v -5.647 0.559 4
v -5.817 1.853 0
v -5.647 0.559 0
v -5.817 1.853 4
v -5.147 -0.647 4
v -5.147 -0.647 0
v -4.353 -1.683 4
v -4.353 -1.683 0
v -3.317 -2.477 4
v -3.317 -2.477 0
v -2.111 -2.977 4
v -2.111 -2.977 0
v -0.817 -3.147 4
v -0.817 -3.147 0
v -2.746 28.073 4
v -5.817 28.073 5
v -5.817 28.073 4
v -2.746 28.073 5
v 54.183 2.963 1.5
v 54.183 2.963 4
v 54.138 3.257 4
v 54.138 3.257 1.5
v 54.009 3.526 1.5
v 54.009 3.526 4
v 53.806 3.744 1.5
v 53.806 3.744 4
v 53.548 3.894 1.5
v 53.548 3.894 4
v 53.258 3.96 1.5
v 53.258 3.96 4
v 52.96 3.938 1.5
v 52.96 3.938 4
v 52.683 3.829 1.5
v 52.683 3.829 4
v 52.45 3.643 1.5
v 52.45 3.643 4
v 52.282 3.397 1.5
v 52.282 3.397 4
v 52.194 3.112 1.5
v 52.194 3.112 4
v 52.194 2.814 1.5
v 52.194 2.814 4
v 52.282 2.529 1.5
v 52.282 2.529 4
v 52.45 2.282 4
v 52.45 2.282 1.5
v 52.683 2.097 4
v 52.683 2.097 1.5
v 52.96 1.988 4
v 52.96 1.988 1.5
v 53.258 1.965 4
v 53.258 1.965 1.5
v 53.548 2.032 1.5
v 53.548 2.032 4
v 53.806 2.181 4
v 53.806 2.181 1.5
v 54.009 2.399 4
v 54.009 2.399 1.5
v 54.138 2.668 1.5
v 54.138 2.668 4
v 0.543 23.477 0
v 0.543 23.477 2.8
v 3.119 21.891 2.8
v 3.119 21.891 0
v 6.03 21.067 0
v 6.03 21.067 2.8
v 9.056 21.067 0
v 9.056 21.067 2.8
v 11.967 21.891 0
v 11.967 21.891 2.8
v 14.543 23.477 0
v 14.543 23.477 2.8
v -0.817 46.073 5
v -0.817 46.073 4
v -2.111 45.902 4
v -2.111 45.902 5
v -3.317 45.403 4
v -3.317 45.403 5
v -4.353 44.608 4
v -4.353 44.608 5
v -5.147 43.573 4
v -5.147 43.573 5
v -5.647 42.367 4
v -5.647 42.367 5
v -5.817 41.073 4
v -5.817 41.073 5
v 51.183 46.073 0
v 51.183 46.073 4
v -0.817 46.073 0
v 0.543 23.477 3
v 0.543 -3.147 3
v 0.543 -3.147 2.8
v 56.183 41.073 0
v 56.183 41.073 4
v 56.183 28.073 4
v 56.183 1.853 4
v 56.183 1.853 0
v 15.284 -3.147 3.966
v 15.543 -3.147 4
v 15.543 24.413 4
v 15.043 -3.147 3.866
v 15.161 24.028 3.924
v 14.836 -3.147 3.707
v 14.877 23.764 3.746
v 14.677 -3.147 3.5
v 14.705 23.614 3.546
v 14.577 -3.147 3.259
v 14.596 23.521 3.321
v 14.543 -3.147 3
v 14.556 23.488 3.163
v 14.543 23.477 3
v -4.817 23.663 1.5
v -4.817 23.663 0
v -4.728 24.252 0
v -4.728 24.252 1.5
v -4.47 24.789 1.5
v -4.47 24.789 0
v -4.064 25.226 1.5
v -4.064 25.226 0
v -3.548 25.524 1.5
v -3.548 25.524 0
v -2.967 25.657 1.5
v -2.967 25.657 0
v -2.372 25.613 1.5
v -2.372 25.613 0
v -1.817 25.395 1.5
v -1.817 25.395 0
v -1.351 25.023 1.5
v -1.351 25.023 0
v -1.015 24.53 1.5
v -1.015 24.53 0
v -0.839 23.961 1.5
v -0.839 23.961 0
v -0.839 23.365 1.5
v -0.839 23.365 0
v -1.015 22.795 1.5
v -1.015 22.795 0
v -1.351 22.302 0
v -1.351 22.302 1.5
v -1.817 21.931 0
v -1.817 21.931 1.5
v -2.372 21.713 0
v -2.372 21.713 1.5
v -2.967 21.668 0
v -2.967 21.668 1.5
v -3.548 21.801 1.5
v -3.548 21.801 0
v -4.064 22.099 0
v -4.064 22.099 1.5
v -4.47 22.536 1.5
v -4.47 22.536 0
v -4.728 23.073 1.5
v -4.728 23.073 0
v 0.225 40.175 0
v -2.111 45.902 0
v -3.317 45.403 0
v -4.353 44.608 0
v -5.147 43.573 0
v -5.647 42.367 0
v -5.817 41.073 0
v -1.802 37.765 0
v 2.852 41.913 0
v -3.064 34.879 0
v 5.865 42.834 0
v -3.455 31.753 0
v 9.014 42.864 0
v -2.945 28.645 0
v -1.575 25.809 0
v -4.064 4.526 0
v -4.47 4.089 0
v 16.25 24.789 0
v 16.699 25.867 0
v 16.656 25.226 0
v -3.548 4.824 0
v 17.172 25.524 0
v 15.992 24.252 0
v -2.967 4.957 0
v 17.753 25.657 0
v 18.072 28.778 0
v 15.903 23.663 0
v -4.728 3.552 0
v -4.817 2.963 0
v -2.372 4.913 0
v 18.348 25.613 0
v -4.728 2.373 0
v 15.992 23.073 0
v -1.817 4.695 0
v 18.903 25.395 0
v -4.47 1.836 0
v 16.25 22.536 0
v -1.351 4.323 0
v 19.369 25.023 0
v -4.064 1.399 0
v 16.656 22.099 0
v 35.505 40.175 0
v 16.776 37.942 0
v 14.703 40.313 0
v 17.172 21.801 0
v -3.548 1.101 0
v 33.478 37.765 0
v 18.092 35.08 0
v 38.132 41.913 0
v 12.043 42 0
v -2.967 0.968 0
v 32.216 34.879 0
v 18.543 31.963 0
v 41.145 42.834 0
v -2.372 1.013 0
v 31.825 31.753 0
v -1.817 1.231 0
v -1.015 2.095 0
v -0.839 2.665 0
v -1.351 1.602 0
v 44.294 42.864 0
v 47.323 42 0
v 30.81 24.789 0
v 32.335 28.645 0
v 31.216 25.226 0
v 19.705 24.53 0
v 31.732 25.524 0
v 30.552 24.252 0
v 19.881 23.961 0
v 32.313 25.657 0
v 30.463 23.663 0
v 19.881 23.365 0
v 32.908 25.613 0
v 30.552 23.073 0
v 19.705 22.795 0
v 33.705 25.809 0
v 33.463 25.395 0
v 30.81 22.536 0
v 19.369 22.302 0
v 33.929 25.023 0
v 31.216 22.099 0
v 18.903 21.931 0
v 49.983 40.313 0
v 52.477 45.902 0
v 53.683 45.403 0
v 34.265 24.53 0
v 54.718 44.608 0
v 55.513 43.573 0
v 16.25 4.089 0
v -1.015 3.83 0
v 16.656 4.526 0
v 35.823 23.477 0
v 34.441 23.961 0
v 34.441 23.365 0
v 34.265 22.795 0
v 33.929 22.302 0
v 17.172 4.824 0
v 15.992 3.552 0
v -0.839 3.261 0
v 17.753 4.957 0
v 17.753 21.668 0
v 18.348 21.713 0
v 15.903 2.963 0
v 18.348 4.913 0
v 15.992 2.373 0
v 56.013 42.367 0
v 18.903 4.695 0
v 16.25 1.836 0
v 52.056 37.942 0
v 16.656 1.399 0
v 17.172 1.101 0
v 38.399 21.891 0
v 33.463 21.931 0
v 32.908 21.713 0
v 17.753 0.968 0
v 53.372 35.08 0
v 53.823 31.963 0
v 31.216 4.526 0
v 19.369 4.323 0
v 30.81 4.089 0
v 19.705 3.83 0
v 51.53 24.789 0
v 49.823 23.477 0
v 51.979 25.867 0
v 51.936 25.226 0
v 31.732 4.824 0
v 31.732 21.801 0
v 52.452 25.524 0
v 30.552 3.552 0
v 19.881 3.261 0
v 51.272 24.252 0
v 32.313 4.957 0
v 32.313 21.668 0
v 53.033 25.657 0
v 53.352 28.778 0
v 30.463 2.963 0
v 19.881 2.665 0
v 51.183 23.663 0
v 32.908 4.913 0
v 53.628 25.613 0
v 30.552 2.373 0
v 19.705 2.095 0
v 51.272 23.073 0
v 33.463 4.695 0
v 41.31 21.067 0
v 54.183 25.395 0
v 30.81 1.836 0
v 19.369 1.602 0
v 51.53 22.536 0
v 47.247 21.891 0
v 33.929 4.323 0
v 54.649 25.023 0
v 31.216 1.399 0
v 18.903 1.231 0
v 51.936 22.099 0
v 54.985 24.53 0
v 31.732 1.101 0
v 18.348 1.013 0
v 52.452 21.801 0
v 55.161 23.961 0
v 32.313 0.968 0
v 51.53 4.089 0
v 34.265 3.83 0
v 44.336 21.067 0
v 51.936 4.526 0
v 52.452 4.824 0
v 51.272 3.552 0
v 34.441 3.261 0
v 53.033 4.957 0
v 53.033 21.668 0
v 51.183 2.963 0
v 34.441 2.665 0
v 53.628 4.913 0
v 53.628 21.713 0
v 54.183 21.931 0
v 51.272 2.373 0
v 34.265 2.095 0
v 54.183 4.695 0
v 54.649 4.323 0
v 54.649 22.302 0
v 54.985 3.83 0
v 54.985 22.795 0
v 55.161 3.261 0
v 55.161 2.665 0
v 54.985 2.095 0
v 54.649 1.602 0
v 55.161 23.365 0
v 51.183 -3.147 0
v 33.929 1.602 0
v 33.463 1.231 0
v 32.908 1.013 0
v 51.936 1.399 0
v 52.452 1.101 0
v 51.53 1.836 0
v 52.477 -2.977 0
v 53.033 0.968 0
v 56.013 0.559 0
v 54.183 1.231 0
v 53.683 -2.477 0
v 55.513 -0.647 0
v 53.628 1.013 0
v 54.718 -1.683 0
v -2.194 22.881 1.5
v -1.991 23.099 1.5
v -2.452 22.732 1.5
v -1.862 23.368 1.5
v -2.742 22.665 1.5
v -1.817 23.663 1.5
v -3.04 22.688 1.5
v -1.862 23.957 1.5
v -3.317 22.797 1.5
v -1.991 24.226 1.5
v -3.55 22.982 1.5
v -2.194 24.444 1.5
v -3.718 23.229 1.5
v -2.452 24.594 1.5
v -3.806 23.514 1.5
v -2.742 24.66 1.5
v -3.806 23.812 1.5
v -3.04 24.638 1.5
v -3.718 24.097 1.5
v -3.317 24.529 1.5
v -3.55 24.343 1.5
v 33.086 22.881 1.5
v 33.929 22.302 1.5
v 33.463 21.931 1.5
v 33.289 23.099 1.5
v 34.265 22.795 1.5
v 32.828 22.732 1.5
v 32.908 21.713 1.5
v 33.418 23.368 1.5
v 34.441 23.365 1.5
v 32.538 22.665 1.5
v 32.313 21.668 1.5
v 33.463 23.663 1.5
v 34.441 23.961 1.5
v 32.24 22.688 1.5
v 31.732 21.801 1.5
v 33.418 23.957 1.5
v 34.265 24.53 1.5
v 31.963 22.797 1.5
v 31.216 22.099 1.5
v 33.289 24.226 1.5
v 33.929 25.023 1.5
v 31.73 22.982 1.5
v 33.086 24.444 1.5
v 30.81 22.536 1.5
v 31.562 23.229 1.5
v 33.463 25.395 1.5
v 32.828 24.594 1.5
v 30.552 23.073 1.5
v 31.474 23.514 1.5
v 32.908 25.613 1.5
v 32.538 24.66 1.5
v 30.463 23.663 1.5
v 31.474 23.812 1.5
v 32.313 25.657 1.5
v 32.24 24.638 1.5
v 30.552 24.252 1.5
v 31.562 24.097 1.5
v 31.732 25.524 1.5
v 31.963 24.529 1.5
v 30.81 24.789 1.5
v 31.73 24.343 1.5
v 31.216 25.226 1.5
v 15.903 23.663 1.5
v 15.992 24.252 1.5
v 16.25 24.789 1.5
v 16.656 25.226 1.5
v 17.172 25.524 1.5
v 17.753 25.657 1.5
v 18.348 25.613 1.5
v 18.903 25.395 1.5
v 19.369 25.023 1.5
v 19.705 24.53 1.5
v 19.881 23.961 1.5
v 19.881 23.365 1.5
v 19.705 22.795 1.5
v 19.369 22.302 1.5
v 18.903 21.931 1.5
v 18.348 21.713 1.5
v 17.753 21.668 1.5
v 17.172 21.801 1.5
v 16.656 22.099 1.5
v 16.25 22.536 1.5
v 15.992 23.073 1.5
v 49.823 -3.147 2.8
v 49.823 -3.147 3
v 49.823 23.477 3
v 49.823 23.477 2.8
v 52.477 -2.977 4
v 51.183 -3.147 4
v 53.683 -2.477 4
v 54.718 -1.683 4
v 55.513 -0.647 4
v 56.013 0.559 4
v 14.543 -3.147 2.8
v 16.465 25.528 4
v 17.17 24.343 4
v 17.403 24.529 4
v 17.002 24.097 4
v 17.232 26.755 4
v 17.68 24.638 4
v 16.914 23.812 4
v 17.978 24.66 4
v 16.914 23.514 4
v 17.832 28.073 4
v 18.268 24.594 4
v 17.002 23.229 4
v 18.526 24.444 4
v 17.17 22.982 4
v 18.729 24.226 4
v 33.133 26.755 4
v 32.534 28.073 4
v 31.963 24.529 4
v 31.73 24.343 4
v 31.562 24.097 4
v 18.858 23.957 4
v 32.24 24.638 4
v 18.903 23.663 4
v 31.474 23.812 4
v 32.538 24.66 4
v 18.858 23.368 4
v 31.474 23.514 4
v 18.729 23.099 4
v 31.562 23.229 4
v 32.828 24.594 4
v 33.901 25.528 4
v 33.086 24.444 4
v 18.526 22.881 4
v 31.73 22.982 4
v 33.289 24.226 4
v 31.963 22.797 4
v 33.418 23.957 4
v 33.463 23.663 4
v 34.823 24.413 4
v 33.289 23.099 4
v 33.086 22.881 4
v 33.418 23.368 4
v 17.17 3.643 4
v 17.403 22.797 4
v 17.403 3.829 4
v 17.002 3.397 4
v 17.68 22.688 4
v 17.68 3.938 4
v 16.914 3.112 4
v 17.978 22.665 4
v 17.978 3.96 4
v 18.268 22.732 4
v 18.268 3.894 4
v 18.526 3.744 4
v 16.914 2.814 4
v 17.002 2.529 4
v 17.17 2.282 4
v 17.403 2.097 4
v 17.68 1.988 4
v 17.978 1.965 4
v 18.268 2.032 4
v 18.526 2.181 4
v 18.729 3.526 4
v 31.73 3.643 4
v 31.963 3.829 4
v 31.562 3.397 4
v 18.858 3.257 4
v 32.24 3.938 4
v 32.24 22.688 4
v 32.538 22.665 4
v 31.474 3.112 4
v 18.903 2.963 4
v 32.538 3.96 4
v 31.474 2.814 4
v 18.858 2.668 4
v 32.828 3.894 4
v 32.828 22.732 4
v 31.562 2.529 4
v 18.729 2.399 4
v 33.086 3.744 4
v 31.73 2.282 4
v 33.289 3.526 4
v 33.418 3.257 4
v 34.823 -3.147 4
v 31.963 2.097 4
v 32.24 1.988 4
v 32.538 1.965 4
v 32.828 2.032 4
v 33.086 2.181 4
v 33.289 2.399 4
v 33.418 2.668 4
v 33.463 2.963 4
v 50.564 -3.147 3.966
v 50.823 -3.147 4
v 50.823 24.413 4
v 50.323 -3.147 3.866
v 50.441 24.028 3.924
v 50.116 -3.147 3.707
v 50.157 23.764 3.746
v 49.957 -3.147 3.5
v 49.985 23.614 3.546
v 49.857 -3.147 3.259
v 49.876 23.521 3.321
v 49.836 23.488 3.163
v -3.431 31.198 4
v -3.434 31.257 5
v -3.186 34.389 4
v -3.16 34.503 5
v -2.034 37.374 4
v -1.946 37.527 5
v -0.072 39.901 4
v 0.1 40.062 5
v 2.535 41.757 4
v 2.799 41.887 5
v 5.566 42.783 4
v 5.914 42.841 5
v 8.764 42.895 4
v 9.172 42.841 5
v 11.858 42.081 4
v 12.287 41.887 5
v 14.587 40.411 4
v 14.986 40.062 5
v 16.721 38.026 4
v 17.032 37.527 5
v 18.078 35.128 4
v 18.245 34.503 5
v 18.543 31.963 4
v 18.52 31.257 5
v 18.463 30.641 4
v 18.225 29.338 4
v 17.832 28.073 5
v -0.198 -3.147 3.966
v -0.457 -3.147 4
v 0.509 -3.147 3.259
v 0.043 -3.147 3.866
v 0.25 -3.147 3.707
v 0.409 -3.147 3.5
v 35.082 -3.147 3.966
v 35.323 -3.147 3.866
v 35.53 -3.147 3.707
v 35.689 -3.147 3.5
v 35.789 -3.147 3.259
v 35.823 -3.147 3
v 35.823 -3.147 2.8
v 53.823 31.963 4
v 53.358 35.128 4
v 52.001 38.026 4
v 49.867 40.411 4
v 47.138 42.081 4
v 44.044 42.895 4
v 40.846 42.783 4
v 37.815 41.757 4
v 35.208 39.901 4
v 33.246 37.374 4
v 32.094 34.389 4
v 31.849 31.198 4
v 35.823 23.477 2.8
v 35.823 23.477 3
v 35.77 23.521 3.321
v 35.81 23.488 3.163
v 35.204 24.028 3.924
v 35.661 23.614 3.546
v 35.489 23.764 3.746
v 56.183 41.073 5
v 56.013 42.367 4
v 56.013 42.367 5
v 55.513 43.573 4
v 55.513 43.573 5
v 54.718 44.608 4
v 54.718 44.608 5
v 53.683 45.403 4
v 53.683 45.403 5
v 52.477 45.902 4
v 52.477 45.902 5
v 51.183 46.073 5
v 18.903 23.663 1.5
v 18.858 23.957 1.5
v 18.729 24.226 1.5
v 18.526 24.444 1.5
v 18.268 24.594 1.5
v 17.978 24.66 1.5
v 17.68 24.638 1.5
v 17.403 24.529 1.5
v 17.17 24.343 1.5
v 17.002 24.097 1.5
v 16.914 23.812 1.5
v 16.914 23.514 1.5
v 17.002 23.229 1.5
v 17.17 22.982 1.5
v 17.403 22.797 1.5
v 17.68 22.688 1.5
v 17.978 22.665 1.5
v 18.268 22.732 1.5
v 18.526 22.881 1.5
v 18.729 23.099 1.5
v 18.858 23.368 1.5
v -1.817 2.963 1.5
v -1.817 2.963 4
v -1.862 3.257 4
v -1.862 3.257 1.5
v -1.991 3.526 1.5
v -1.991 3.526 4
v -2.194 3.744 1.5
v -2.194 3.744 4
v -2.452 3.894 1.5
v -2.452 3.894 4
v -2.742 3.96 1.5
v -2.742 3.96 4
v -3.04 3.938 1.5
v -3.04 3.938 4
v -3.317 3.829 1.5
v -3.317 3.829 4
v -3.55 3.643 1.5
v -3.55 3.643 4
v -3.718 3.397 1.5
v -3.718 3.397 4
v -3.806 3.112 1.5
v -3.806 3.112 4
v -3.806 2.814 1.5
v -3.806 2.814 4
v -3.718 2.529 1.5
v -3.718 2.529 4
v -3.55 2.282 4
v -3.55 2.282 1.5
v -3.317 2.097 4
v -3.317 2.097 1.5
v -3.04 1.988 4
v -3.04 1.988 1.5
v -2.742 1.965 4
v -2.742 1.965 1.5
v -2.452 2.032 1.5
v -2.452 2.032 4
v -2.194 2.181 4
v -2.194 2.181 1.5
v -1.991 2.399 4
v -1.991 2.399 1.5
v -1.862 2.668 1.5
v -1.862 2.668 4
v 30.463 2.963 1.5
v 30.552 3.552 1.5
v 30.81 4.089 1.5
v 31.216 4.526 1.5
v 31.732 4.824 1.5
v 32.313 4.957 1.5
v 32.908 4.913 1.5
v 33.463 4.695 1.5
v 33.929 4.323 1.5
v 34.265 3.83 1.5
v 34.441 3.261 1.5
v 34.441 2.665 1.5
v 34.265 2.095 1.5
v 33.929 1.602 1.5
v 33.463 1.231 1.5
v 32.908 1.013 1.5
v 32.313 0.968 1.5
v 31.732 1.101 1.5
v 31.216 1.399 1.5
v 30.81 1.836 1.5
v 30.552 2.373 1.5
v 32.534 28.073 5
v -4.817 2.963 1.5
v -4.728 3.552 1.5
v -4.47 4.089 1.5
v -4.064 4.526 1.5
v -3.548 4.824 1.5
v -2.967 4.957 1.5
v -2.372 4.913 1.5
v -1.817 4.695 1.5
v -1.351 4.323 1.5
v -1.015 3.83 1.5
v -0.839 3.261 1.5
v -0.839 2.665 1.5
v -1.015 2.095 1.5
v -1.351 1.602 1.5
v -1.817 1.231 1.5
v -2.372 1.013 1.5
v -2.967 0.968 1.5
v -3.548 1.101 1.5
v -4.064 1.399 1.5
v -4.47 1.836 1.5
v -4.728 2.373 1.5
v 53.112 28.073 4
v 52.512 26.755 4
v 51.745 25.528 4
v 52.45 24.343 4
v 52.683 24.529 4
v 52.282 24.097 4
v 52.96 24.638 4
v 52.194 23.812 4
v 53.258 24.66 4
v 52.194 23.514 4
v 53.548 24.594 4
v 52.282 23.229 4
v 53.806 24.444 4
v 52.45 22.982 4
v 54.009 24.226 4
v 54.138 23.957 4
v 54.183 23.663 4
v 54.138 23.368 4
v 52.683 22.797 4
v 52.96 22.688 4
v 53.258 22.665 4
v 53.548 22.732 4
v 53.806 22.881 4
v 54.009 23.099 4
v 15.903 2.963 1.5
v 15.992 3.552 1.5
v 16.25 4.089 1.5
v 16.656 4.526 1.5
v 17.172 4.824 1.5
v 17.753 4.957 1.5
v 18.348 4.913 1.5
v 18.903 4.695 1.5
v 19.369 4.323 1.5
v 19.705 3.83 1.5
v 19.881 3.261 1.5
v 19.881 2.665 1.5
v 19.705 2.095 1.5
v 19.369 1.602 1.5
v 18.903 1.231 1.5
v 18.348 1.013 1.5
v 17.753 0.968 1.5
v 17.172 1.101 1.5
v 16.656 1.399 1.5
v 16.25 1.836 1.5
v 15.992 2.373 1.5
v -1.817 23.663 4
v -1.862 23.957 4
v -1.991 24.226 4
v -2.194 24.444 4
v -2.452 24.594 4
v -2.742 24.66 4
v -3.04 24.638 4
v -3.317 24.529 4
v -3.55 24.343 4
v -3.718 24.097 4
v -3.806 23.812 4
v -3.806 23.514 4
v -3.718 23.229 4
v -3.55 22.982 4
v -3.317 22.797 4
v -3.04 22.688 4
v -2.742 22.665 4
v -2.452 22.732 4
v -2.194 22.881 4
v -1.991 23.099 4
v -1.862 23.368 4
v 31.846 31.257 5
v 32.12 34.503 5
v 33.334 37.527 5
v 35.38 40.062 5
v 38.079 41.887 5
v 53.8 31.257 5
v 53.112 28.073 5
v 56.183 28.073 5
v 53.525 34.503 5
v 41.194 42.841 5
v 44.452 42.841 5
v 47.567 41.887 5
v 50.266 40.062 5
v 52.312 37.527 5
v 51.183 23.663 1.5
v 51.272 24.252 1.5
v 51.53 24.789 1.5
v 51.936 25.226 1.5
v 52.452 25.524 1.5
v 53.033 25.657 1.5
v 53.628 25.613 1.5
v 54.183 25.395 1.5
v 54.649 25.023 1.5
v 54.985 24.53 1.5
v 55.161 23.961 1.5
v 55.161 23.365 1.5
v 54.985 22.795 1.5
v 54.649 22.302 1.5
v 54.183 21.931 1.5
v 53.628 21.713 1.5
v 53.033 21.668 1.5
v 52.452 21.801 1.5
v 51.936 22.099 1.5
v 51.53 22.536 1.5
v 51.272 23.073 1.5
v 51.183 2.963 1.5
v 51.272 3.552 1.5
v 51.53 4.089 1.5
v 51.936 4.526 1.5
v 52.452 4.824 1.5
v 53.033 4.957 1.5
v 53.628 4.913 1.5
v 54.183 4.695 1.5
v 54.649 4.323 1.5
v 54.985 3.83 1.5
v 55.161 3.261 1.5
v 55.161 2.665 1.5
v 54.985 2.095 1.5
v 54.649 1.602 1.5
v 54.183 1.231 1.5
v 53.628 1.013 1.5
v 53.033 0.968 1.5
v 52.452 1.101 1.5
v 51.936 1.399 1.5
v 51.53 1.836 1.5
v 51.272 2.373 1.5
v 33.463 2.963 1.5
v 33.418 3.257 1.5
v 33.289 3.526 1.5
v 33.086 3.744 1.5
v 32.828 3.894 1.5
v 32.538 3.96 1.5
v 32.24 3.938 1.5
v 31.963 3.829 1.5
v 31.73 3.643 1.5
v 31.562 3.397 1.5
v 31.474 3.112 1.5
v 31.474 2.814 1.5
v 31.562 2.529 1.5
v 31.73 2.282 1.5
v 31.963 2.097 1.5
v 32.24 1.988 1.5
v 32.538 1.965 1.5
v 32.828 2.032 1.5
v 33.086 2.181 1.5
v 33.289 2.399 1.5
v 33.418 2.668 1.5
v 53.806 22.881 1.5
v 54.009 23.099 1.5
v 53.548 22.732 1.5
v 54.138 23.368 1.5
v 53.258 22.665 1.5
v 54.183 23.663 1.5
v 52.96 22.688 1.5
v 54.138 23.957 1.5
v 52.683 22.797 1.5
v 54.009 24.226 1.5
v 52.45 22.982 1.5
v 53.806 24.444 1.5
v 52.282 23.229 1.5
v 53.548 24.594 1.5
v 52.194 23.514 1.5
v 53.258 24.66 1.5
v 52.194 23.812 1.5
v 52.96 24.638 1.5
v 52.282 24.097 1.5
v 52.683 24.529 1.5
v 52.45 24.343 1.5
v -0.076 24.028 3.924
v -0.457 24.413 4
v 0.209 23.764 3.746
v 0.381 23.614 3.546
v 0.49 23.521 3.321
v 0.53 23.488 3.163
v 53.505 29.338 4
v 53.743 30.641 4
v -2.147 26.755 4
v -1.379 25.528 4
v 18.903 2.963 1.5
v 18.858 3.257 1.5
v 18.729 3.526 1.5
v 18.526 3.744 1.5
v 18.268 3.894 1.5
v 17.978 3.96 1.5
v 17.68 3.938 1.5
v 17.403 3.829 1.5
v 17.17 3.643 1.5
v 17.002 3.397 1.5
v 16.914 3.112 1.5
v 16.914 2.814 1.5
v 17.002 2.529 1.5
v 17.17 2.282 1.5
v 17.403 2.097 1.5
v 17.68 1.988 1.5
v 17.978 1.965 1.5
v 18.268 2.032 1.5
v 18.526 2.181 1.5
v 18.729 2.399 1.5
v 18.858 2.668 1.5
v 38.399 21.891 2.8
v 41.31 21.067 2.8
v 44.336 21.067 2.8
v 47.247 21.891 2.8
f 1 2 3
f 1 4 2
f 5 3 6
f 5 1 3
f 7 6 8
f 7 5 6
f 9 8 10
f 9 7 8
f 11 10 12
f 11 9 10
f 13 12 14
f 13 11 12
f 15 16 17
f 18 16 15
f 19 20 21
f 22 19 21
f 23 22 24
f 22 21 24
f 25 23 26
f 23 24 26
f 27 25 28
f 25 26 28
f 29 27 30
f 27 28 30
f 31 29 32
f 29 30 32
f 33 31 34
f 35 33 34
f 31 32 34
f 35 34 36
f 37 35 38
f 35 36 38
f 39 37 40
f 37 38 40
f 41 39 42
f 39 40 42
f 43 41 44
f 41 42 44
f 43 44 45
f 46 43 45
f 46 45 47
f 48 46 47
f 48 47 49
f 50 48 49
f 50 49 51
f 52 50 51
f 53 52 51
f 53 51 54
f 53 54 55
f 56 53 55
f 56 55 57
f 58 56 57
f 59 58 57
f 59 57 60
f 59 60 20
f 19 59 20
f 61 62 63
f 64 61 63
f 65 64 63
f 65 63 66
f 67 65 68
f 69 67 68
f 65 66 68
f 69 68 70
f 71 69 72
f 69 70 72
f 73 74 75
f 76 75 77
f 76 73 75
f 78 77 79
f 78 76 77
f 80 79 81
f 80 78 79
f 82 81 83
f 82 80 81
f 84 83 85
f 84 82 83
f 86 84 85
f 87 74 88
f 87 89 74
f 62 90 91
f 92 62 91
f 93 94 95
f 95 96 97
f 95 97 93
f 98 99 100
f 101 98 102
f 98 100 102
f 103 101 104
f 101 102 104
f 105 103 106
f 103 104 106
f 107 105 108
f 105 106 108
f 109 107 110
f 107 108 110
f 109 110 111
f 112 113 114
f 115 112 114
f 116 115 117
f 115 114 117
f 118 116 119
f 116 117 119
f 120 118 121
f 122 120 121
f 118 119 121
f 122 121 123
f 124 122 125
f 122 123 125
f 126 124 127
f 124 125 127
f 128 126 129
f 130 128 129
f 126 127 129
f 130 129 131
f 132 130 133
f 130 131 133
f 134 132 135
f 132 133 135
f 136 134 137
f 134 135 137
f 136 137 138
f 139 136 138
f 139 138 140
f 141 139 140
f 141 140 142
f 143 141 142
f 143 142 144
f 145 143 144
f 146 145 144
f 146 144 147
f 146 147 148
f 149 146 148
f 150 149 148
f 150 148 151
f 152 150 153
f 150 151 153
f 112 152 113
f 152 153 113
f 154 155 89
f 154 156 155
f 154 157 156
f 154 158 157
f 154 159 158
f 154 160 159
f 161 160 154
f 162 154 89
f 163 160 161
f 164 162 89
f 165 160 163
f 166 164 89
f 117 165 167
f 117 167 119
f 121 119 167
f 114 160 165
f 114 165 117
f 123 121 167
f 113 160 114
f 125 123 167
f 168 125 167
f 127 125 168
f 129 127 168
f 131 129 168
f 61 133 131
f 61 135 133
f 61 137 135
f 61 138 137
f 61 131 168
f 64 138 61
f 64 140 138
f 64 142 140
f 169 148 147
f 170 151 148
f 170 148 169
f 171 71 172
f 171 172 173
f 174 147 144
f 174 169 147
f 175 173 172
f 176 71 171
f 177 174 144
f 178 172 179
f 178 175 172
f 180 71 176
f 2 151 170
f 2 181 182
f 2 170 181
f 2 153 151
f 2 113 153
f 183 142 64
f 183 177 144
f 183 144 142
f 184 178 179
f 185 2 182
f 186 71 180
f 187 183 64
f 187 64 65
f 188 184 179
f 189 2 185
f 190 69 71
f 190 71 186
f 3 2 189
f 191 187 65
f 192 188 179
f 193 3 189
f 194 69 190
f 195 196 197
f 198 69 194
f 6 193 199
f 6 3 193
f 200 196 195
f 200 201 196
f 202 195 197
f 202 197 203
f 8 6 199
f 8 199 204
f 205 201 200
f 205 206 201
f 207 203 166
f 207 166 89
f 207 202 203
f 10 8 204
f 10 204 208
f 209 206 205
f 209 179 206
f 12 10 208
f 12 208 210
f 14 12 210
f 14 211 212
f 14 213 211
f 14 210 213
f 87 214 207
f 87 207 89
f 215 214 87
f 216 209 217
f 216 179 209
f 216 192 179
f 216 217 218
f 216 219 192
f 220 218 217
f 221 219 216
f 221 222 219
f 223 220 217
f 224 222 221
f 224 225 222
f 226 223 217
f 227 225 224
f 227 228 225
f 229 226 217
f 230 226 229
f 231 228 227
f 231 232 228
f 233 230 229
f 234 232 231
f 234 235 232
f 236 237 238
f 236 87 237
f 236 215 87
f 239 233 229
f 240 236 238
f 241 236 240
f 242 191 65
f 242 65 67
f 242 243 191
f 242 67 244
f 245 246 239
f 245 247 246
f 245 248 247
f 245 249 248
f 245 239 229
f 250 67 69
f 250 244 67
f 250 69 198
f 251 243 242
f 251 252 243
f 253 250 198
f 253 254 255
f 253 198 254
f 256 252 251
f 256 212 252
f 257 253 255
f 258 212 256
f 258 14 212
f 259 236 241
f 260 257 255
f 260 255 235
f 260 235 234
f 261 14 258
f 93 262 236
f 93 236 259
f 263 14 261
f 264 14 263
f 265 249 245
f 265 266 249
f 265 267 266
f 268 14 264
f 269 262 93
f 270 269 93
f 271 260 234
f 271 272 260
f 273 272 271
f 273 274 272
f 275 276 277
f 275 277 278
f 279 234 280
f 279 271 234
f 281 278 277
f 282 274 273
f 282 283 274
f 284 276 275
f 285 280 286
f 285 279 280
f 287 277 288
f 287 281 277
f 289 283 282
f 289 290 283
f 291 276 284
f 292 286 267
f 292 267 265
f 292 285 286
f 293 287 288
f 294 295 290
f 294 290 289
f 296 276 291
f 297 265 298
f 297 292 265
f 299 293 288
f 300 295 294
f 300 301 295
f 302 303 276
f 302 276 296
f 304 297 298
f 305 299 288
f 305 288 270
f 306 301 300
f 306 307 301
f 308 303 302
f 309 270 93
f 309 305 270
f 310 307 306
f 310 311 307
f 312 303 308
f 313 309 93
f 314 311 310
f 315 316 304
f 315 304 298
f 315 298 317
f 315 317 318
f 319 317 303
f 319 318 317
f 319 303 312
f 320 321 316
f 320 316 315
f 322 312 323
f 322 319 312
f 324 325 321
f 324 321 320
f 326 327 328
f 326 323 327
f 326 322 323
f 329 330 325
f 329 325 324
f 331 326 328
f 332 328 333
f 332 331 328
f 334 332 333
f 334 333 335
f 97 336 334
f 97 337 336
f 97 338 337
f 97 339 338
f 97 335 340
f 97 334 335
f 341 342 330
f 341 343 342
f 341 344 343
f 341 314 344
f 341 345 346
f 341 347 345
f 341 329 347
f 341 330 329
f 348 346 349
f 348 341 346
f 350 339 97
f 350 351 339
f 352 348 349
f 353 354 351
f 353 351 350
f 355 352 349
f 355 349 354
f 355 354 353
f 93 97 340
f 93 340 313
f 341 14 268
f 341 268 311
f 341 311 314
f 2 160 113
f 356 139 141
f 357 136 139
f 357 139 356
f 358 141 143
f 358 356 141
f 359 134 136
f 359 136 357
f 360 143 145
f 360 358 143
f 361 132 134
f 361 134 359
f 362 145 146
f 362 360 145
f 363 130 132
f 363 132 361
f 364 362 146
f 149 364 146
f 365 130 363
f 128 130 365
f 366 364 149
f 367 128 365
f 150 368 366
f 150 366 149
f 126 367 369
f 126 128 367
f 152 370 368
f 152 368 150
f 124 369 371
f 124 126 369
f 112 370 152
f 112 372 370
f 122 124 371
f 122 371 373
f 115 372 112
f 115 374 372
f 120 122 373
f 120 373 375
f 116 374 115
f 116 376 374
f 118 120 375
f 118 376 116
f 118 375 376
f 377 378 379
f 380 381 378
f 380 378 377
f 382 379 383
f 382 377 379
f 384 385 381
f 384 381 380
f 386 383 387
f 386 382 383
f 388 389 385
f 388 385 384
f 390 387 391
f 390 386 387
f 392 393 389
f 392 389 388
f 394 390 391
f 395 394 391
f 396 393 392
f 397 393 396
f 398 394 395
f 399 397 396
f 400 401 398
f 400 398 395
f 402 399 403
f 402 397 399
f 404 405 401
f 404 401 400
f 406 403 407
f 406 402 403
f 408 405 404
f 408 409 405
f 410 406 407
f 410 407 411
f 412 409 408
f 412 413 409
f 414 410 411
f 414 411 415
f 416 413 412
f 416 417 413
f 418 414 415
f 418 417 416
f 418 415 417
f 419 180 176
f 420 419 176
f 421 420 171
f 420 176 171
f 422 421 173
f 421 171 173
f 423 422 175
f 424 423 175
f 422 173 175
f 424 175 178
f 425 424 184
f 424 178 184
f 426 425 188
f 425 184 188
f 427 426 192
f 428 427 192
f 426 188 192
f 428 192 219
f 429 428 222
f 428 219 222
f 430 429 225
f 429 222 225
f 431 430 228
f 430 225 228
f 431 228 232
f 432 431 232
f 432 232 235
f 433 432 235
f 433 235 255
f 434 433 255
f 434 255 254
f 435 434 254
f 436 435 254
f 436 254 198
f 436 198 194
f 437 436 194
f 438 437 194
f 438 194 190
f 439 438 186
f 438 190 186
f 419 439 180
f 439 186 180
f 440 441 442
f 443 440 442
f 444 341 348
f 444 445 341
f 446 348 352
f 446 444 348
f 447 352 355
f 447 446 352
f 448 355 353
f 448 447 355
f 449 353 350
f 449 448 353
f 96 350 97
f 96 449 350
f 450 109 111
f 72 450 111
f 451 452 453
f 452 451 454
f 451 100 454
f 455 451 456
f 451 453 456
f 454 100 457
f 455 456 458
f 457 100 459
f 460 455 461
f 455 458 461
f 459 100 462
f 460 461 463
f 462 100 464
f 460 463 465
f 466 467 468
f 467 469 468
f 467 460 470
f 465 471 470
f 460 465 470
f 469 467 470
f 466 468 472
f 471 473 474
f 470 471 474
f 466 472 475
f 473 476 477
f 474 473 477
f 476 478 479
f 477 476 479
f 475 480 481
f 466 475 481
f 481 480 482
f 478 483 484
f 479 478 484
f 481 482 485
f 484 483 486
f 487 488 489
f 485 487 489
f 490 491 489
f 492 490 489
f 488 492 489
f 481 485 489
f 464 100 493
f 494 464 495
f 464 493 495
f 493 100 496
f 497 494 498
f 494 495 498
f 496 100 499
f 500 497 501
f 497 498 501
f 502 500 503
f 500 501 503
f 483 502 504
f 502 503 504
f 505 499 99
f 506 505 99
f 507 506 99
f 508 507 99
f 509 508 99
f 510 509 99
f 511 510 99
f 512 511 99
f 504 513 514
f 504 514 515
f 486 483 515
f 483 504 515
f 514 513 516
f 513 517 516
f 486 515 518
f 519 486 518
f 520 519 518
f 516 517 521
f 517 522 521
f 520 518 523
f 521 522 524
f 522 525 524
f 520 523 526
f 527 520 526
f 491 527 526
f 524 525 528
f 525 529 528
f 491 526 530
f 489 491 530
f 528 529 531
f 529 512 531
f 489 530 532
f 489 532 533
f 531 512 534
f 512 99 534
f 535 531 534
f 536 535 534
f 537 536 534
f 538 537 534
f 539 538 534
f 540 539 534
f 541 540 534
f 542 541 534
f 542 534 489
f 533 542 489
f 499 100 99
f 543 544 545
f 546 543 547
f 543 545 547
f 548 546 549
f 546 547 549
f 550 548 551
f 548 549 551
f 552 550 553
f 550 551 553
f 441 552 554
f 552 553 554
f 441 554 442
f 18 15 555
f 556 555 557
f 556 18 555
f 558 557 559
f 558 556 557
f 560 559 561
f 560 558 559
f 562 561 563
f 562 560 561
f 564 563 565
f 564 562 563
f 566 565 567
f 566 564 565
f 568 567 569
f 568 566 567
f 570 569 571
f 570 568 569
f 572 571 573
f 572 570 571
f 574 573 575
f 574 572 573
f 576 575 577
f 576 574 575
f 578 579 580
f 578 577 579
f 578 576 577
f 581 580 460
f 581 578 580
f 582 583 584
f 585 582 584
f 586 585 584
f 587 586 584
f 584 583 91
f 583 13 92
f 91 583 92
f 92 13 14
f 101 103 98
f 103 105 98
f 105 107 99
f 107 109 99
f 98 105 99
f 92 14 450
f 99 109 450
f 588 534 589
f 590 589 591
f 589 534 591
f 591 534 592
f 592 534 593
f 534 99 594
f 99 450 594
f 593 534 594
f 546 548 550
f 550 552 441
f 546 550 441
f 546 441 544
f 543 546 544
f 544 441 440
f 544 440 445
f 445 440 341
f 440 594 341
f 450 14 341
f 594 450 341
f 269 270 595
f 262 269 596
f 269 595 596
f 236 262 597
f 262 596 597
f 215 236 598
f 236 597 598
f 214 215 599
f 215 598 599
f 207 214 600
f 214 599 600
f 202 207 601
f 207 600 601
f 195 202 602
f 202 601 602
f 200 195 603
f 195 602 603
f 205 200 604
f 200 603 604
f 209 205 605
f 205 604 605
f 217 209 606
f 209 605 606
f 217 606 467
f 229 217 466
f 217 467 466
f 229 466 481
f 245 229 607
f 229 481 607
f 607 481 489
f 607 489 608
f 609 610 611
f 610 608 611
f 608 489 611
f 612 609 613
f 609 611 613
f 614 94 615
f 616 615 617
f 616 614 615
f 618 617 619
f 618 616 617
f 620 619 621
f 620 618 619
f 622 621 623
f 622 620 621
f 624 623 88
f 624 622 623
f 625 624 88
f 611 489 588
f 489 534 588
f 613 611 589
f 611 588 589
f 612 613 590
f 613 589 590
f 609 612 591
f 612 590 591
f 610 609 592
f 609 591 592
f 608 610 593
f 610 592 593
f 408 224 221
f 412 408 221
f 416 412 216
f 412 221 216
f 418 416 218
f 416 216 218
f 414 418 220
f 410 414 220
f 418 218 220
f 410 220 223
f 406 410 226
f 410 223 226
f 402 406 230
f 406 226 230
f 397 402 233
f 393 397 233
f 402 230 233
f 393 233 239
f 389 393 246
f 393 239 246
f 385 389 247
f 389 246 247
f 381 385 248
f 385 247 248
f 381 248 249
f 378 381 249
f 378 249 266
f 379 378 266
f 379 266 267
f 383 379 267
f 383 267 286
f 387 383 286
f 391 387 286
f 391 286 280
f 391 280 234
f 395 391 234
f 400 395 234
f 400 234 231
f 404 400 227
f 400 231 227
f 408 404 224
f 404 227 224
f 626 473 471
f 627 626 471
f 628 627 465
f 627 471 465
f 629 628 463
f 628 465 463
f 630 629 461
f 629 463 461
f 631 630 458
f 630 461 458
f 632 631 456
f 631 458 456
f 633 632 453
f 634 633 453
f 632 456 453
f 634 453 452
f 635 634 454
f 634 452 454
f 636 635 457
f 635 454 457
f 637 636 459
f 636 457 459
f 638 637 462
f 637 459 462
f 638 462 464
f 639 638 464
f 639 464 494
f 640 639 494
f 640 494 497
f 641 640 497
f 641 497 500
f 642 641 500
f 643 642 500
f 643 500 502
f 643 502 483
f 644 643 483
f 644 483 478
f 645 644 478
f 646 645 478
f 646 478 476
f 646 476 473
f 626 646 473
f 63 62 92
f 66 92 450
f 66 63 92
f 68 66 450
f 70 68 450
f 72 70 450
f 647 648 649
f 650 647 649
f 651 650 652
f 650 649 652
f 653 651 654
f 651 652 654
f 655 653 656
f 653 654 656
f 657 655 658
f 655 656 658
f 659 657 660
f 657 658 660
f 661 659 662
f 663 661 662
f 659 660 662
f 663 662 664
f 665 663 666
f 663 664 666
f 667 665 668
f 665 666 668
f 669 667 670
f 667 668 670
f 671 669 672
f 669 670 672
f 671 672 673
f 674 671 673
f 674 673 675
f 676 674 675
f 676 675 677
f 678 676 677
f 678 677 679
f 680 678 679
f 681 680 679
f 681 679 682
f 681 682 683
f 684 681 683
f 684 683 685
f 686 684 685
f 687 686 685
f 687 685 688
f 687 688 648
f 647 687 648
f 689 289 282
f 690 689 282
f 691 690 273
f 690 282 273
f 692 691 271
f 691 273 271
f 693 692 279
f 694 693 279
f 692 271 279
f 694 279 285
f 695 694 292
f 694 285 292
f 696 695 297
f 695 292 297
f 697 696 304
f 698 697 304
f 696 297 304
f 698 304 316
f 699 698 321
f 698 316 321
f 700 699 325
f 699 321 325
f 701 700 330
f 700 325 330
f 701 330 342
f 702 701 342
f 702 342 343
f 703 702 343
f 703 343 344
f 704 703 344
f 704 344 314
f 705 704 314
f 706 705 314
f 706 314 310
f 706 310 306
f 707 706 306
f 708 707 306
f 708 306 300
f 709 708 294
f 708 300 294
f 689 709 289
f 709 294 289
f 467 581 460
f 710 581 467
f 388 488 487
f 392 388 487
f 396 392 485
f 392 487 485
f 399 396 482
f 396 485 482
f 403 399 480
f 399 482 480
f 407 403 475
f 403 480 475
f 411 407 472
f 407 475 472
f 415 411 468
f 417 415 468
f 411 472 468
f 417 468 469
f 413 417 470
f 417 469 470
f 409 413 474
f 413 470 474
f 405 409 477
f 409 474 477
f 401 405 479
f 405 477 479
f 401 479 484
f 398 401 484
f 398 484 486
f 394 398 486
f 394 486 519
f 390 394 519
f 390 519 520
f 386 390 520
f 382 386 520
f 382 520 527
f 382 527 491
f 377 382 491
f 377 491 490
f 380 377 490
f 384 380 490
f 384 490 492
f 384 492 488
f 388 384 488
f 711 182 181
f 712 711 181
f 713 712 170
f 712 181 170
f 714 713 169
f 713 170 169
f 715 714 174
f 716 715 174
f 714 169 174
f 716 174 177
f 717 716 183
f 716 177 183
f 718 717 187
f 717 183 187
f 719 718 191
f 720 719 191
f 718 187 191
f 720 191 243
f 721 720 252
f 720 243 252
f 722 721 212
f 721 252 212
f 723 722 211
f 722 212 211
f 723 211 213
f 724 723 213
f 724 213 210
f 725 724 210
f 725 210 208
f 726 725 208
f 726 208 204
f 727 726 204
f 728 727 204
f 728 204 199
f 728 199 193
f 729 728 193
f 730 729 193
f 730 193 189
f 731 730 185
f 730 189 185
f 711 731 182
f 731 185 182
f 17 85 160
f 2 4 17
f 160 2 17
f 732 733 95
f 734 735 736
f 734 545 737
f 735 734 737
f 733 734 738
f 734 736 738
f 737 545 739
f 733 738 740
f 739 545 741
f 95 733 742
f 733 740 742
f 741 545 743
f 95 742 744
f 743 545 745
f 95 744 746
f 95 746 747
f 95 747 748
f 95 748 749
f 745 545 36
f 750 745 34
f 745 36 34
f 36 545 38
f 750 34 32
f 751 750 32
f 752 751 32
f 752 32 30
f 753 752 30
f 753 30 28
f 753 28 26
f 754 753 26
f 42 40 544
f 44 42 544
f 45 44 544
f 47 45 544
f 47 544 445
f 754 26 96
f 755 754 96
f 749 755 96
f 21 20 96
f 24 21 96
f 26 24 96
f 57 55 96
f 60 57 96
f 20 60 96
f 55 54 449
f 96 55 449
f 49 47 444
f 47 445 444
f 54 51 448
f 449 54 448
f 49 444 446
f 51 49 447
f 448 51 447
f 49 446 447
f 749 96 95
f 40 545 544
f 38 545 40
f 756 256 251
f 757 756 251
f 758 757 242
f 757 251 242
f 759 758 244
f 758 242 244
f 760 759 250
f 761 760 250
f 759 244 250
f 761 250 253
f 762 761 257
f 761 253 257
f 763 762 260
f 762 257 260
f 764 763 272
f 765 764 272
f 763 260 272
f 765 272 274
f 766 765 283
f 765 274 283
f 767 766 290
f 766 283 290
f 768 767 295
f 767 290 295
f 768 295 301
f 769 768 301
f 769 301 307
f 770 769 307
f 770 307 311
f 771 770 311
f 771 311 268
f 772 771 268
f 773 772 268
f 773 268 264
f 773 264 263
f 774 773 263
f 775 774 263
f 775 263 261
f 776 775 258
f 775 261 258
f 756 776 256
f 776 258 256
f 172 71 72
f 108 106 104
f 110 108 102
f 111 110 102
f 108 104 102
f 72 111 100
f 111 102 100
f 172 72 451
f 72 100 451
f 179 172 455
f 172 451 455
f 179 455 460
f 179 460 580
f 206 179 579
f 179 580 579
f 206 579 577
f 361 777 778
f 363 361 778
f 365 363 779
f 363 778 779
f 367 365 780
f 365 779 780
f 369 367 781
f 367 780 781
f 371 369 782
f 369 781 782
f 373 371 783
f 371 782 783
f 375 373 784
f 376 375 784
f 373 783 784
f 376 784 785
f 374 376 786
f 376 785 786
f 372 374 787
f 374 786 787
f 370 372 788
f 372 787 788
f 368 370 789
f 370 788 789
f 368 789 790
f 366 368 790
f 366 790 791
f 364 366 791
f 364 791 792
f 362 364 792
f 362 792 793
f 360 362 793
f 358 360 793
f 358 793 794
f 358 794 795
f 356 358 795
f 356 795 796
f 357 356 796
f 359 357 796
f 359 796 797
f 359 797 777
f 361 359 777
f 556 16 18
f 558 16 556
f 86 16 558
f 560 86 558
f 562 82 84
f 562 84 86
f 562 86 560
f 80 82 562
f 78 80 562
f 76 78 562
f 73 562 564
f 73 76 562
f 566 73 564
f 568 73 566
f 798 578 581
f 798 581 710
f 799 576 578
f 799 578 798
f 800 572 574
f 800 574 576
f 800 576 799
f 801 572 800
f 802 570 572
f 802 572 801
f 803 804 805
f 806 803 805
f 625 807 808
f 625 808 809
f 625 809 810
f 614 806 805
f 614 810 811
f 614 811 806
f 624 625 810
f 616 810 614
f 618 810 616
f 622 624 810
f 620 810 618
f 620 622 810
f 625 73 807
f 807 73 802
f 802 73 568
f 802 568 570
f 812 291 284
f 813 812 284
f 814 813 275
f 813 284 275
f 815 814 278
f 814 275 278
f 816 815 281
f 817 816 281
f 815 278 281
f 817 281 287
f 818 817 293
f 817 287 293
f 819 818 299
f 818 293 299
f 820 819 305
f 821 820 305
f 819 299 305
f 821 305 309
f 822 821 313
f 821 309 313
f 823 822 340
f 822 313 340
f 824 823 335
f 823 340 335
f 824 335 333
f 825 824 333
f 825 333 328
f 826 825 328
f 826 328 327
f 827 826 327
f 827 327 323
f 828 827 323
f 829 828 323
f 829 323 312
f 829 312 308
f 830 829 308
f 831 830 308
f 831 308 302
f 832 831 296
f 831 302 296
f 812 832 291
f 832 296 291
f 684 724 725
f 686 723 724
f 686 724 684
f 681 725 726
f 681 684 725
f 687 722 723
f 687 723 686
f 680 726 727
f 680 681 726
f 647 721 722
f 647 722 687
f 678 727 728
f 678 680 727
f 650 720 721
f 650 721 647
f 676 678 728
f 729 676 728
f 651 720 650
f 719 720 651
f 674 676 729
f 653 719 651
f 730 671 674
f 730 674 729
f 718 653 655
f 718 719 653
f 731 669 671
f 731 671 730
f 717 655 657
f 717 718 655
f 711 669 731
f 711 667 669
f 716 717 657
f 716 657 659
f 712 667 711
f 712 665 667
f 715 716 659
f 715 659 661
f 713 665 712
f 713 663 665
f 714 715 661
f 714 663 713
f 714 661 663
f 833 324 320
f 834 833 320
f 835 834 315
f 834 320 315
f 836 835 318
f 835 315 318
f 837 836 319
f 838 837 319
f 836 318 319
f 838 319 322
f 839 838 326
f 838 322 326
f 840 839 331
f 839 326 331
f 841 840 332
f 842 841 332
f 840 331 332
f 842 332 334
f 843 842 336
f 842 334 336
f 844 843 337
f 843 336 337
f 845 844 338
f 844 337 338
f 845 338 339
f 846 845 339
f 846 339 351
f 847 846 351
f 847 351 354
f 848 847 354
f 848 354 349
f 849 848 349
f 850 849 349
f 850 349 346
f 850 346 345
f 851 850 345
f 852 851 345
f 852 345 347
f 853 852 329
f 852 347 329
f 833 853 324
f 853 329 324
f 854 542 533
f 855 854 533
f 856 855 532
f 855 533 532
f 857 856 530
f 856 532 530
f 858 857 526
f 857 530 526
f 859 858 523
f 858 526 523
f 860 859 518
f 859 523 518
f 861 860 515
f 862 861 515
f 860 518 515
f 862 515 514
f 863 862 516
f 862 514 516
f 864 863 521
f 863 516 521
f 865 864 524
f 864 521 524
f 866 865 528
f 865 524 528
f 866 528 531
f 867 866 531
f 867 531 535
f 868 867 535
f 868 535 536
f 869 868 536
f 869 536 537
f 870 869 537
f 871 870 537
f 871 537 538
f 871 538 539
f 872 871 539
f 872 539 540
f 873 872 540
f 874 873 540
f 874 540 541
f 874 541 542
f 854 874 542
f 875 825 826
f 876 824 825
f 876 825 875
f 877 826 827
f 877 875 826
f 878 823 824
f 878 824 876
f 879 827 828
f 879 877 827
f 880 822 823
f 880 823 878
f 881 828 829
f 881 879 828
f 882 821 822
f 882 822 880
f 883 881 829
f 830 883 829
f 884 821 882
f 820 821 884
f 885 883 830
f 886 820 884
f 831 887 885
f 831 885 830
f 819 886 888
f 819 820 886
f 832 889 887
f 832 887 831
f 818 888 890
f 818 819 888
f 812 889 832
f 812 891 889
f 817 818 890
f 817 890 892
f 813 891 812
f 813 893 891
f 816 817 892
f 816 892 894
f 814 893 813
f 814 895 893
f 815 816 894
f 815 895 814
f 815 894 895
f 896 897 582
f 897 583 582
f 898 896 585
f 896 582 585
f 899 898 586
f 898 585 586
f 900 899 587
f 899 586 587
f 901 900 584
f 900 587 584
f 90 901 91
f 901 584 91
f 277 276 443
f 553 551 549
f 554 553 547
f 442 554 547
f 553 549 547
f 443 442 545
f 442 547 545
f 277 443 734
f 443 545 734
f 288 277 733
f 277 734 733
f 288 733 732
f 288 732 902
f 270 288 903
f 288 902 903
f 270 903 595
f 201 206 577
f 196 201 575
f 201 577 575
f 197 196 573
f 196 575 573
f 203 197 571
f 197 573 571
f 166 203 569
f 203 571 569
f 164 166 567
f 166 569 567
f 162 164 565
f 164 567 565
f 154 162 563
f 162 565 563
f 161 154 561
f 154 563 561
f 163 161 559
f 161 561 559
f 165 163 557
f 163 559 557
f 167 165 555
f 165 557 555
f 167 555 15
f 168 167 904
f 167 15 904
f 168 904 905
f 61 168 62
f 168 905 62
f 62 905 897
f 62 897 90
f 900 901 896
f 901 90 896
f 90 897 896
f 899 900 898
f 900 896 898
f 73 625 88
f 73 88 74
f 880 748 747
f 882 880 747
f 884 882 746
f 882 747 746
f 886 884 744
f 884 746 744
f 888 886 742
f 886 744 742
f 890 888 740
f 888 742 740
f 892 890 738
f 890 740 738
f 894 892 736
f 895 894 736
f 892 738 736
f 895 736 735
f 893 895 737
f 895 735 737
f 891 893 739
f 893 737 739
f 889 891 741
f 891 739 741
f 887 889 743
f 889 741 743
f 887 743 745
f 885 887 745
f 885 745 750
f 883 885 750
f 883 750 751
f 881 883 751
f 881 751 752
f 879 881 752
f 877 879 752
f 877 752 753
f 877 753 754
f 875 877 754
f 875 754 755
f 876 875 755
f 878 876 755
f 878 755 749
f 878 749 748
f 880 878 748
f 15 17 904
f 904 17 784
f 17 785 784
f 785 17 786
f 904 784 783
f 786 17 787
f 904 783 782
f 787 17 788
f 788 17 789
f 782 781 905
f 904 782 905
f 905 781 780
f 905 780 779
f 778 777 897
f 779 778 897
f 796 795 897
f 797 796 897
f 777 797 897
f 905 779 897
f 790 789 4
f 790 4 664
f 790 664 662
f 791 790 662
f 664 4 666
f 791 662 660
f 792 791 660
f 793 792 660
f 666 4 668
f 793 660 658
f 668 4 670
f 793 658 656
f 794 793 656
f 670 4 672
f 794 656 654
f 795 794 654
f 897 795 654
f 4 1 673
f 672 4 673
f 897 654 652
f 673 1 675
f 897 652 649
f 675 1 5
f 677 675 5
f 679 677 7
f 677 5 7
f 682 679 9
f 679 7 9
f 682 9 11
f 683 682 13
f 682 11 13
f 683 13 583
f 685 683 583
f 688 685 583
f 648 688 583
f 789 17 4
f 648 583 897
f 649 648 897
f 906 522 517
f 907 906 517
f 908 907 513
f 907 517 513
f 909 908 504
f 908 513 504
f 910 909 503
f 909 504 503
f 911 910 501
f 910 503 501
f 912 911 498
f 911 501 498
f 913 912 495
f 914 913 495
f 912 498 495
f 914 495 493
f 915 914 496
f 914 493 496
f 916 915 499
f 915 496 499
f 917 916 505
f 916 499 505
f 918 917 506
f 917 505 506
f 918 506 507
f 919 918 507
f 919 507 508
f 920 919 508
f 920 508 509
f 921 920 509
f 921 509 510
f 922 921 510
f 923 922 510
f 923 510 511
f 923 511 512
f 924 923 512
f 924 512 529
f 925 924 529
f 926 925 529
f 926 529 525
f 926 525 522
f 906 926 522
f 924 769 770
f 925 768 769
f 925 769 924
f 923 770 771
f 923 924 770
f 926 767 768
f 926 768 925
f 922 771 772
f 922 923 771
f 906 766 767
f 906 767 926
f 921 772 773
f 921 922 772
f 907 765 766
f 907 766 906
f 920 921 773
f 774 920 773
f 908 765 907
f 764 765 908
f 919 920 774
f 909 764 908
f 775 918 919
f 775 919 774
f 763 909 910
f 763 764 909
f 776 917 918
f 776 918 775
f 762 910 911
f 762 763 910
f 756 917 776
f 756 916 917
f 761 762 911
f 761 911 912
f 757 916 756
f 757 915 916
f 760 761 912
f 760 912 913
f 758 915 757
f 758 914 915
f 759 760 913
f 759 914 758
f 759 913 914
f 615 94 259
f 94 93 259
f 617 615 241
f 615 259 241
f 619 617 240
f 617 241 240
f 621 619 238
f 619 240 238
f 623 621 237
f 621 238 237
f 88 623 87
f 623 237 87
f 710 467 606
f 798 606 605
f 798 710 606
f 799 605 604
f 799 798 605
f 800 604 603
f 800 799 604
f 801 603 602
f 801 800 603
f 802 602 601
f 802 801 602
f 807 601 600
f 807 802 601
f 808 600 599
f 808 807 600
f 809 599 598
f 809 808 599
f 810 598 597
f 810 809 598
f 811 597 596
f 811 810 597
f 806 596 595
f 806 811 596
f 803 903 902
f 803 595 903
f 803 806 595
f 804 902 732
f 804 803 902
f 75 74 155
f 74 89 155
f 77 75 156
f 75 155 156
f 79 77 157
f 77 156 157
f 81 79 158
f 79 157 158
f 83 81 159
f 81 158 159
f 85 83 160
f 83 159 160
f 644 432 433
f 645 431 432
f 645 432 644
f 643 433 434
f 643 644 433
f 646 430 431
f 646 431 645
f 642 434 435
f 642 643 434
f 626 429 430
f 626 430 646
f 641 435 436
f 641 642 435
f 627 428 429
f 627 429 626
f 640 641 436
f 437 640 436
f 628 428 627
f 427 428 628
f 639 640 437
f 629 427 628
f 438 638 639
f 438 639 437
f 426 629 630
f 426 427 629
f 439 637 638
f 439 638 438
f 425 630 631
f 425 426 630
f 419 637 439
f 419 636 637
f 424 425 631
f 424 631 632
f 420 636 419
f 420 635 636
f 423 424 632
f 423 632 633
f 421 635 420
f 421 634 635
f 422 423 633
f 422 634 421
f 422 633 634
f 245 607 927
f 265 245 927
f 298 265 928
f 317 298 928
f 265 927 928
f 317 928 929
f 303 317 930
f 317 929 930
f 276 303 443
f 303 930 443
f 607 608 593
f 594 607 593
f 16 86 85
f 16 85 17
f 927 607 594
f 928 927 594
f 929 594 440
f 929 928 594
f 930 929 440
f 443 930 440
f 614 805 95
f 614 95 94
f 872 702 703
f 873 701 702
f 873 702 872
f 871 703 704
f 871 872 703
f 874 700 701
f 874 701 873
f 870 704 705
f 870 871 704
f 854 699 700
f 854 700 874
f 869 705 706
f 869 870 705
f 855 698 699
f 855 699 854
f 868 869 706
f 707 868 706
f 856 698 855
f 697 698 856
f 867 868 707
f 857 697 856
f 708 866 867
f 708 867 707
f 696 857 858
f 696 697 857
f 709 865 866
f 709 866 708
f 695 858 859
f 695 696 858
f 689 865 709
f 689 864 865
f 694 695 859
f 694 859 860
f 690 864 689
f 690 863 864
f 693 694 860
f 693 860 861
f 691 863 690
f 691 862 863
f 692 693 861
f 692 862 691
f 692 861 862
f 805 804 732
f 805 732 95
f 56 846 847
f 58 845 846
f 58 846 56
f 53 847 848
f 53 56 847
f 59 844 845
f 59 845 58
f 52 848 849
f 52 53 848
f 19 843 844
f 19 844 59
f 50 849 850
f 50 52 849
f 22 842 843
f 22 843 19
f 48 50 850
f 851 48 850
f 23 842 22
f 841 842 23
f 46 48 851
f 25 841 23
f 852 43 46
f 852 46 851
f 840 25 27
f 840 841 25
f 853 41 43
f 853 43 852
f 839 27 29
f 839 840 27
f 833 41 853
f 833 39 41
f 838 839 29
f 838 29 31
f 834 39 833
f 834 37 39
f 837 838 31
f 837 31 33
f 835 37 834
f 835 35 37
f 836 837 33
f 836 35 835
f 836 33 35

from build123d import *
from build123d.topology import SkipClean

# Parameters (mm, degrees)
SKETCH_1_W          = 62
SKETCH_1_H          = 45.22
EXTRUDE_1_DEPTH     = 4
SKETCH_7_W          = 62
SKETCH_7_H          = 4
EXTRUDE_4_DEPTH     = 4
SKETCH_2_R          = 11
SKETCH_2_R_2        = 1
CUT_EXTRUDE_1_DEPTH = 4
CUT_EXTRUDE_2_DEPTH = 1.2
FILLET_2_R          = 5
FILLET_4_R          = 5
FILLET_6_R          = 1
FILLET_7_R          = 1
FILLET_8_R          = 1
FILLET_9_R          = 1
SKETCH_3_R          = 2
CUT_EXTRUDE_6_DEPTH = 1.5
FILLET_10_R         = 5
FILLET_11_R         = 5
EXTRUDE_START       = 1
EXTRUDE_5_DEPTH     = 1


with BuildPart() as part:
    # 草图1 → 凸台-拉伸1 (new body)
    with BuildSketch(Plane.XY):
        with Locations((25.182910647, 19.462647059)):
            Rectangle(SKETCH_1_W, SKETCH_1_H)
    extrude(amount=EXTRUDE_1_DEPTH)

    # 草图7 → 凸台-拉伸4 (add)
    with BuildSketch(Plane(origin=(0, 42.072647059, 0), x_dir=(1, 0, 0), z_dir=(0, 1, 0))):
        with Locations((25.182910647, -2)):
            Rectangle(SKETCH_7_W, SKETCH_7_H)
    extrude(amount=EXTRUDE_4_DEPTH)

    # 草图2 → 切除-拉伸1 (cut)
    with BuildSketch(Plane.XY.offset(4)):
        with Locations((7.542910647, 31.962647059)):
            Circle(SKETCH_2_R)
        with Locations((42.822910647, 31.962647059)):
            Circle(SKETCH_2_R)
        with Locations((-2.817089353, 2.962647059)):
            Circle(SKETCH_2_R_2)
        with Locations((17.902910647, 2.962647059)):
            Circle(SKETCH_2_R_2)
        with Locations((-2.817089353, 23.662647059)):
            Circle(SKETCH_2_R_2)
        with Locations((17.902910647, 23.662647059)):
            Circle(SKETCH_2_R_2)
        with Locations((53.182910647, 2.962647059)):
            Circle(SKETCH_2_R_2)
        with Locations((32.462910647, 2.962647059)):
            Circle(SKETCH_2_R_2)
        with Locations((32.462910647, 23.662647059)):
            Circle(SKETCH_2_R_2)
        with Locations((53.182910647, 23.662647059)):
            Circle(SKETCH_2_R_2)
    extrude(amount=-CUT_EXTRUDE_1_DEPTH, mode=Mode.SUBTRACT)

    # 草图2<3> → 切除-拉伸2 (cut)
    with BuildSketch(Plane.XY.offset(4)):
        with BuildLine():
            Line((0.542910647, 23.477365685), (0.542910647, -3.147352941))
            Line((0.542910647, -3.147352941), (14.542910647, -3.147352941))
            Line((14.542910647, -3.147352941), (14.542910647, 23.477365685))
            ThreePointArc((14.542910647, 23.477365685), (7.542910647, 20.962647059), (0.542910647, 23.477365685))
        make_face()
        with BuildLine():
            Line((35.822910647, 23.477365685), (35.822910647, -3.147352941))
            Line((35.822910647, -3.147352941), (49.822910647, -3.147352941))
            Line((49.822910647, -3.147352941), (49.822910647, 23.477365685))
            ThreePointArc((49.822910647, 23.477365685), (42.822910647, 20.962647059), (35.822910647, 23.477365685))
        make_face()
    extrude(amount=-CUT_EXTRUDE_2_DEPTH, mode=Mode.SUBTRACT)

    # 圆角2
    fillet_2_edges = [part.edges().sort_by_distance(p)[0] for p in [
        (-5.817089353, -3.147352941, 2),
    ]]
    fillet(fillet_2_edges, radius=FILLET_2_R)

    # 圆角4
    fillet_4_edges = [part.edges().sort_by_distance(p)[0] for p in [
        (56.182910647, -3.147352941, 2),
    ]]
    fillet(fillet_4_edges, radius=FILLET_4_R)

    # 圆角6
    fillet_6_edges = [part.edges().sort_by_distance(p)[0] for p in [
        (14.542910647, 10.165006372, 4),
    ]]
    fillet(fillet_6_edges, radius=FILLET_6_R)

    # 圆角7
    fillet_7_edges = [part.edges().sort_by_distance(p)[0] for p in [
        (0.542910647, 10.165006372, 4),
    ]]
    fillet(fillet_7_edges, radius=FILLET_7_R)

    # 圆角8
    fillet_8_edges = [part.edges().sort_by_distance(p)[0] for p in [
        (35.822910647, 10.165006372, 4),
    ]]
    fillet(fillet_8_edges, radius=FILLET_8_R)

    # 圆角9
    fillet_9_edges = [part.edges().sort_by_distance(p)[0] for p in [
        (49.822910647, 10.165006372, 4),
    ]]
    fillet(fillet_9_edges, radius=FILLET_9_R)

    # 草图3 → 切除-拉伸6 (cut)
    with BuildSketch(Plane(origin=(0, 0, 0), x_dir=(-1, 0, 0), z_dir=(0, 0, -1))):
        with Locations((-53.182910647, 2.962647059)):
            Circle(SKETCH_3_R)
        with Locations((-32.462910647, 2.962647059)):
            Circle(SKETCH_3_R)
        with Locations((-17.902910647, 2.962647059)):
            Circle(SKETCH_3_R)
        with Locations((2.817089353, 2.962647059)):
            Circle(SKETCH_3_R)
        with Locations((-53.182910647, 23.662647059)):
            Circle(SKETCH_3_R)
        with Locations((-32.462910647, 23.662647059)):
            Circle(SKETCH_3_R)
        with Locations((-17.902910647, 23.662647059)):
            Circle(SKETCH_3_R)
        with Locations((2.817089353, 23.662647059)):
            Circle(SKETCH_3_R)
    extrude(amount=-CUT_EXTRUDE_6_DEPTH, mode=Mode.SUBTRACT)

    # 圆角10
    fillet_10_edges = [part.edges().sort_by_distance(p)[0] for p in [
        (56.182910647, 46.072647059, 2),
    ]]
    fillet(fillet_10_edges, radius=FILLET_10_R)

    # 圆角11
    fillet_11_edges = [part.edges().sort_by_distance(p)[0] for p in [
        (-5.817089353, 46.072647059, 2),
    ]]
    fillet(fillet_11_edges, radius=FILLET_11_R)

    # 草图8 → 凸台-拉伸5 (add)
    with SkipClean():  # the faces are left unmerged after this step: merging them gives an invalid solid
        with BuildSketch(Plane.XY.offset(4).offset(EXTRUDE_START)):
            with BuildLine():
                Line((53.112123445, 28.072647059), (56.182910647, 28.072647059))
                Line((56.182910647, 28.072647059), (56.182910647, 41.072647059))
                ThreePointArc((56.182910647, 41.072647059), (54.718444553, 44.608180965), (51.182910647, 46.072647059))
                Line((51.182910647, 46.072647059), (-0.817089353, 46.072647059))
                ThreePointArc((-0.817089353, 46.072647059), (-4.352623259, 44.608180965), (-5.817089353, 41.072647059))
                Line((-5.817089353, 41.072647059), (-5.817089353, 28.072647059))
                Line((-5.817089353, 28.072647059), (-2.746302151, 28.072647059))
                ThreePointArc((-2.746302151, 28.072647059), (7.542910647, 42.962647059), (17.832123445, 28.072647059))
                Line((17.832123445, 28.072647059), (32.533697849, 28.072647059))
                ThreePointArc((32.533697849, 28.072647059), (42.822910647, 42.962647059), (53.112123445, 28.072647059))
            make_face()
        extrude(amount=-EXTRUDE_5_DEPTH)


solid = part.part
